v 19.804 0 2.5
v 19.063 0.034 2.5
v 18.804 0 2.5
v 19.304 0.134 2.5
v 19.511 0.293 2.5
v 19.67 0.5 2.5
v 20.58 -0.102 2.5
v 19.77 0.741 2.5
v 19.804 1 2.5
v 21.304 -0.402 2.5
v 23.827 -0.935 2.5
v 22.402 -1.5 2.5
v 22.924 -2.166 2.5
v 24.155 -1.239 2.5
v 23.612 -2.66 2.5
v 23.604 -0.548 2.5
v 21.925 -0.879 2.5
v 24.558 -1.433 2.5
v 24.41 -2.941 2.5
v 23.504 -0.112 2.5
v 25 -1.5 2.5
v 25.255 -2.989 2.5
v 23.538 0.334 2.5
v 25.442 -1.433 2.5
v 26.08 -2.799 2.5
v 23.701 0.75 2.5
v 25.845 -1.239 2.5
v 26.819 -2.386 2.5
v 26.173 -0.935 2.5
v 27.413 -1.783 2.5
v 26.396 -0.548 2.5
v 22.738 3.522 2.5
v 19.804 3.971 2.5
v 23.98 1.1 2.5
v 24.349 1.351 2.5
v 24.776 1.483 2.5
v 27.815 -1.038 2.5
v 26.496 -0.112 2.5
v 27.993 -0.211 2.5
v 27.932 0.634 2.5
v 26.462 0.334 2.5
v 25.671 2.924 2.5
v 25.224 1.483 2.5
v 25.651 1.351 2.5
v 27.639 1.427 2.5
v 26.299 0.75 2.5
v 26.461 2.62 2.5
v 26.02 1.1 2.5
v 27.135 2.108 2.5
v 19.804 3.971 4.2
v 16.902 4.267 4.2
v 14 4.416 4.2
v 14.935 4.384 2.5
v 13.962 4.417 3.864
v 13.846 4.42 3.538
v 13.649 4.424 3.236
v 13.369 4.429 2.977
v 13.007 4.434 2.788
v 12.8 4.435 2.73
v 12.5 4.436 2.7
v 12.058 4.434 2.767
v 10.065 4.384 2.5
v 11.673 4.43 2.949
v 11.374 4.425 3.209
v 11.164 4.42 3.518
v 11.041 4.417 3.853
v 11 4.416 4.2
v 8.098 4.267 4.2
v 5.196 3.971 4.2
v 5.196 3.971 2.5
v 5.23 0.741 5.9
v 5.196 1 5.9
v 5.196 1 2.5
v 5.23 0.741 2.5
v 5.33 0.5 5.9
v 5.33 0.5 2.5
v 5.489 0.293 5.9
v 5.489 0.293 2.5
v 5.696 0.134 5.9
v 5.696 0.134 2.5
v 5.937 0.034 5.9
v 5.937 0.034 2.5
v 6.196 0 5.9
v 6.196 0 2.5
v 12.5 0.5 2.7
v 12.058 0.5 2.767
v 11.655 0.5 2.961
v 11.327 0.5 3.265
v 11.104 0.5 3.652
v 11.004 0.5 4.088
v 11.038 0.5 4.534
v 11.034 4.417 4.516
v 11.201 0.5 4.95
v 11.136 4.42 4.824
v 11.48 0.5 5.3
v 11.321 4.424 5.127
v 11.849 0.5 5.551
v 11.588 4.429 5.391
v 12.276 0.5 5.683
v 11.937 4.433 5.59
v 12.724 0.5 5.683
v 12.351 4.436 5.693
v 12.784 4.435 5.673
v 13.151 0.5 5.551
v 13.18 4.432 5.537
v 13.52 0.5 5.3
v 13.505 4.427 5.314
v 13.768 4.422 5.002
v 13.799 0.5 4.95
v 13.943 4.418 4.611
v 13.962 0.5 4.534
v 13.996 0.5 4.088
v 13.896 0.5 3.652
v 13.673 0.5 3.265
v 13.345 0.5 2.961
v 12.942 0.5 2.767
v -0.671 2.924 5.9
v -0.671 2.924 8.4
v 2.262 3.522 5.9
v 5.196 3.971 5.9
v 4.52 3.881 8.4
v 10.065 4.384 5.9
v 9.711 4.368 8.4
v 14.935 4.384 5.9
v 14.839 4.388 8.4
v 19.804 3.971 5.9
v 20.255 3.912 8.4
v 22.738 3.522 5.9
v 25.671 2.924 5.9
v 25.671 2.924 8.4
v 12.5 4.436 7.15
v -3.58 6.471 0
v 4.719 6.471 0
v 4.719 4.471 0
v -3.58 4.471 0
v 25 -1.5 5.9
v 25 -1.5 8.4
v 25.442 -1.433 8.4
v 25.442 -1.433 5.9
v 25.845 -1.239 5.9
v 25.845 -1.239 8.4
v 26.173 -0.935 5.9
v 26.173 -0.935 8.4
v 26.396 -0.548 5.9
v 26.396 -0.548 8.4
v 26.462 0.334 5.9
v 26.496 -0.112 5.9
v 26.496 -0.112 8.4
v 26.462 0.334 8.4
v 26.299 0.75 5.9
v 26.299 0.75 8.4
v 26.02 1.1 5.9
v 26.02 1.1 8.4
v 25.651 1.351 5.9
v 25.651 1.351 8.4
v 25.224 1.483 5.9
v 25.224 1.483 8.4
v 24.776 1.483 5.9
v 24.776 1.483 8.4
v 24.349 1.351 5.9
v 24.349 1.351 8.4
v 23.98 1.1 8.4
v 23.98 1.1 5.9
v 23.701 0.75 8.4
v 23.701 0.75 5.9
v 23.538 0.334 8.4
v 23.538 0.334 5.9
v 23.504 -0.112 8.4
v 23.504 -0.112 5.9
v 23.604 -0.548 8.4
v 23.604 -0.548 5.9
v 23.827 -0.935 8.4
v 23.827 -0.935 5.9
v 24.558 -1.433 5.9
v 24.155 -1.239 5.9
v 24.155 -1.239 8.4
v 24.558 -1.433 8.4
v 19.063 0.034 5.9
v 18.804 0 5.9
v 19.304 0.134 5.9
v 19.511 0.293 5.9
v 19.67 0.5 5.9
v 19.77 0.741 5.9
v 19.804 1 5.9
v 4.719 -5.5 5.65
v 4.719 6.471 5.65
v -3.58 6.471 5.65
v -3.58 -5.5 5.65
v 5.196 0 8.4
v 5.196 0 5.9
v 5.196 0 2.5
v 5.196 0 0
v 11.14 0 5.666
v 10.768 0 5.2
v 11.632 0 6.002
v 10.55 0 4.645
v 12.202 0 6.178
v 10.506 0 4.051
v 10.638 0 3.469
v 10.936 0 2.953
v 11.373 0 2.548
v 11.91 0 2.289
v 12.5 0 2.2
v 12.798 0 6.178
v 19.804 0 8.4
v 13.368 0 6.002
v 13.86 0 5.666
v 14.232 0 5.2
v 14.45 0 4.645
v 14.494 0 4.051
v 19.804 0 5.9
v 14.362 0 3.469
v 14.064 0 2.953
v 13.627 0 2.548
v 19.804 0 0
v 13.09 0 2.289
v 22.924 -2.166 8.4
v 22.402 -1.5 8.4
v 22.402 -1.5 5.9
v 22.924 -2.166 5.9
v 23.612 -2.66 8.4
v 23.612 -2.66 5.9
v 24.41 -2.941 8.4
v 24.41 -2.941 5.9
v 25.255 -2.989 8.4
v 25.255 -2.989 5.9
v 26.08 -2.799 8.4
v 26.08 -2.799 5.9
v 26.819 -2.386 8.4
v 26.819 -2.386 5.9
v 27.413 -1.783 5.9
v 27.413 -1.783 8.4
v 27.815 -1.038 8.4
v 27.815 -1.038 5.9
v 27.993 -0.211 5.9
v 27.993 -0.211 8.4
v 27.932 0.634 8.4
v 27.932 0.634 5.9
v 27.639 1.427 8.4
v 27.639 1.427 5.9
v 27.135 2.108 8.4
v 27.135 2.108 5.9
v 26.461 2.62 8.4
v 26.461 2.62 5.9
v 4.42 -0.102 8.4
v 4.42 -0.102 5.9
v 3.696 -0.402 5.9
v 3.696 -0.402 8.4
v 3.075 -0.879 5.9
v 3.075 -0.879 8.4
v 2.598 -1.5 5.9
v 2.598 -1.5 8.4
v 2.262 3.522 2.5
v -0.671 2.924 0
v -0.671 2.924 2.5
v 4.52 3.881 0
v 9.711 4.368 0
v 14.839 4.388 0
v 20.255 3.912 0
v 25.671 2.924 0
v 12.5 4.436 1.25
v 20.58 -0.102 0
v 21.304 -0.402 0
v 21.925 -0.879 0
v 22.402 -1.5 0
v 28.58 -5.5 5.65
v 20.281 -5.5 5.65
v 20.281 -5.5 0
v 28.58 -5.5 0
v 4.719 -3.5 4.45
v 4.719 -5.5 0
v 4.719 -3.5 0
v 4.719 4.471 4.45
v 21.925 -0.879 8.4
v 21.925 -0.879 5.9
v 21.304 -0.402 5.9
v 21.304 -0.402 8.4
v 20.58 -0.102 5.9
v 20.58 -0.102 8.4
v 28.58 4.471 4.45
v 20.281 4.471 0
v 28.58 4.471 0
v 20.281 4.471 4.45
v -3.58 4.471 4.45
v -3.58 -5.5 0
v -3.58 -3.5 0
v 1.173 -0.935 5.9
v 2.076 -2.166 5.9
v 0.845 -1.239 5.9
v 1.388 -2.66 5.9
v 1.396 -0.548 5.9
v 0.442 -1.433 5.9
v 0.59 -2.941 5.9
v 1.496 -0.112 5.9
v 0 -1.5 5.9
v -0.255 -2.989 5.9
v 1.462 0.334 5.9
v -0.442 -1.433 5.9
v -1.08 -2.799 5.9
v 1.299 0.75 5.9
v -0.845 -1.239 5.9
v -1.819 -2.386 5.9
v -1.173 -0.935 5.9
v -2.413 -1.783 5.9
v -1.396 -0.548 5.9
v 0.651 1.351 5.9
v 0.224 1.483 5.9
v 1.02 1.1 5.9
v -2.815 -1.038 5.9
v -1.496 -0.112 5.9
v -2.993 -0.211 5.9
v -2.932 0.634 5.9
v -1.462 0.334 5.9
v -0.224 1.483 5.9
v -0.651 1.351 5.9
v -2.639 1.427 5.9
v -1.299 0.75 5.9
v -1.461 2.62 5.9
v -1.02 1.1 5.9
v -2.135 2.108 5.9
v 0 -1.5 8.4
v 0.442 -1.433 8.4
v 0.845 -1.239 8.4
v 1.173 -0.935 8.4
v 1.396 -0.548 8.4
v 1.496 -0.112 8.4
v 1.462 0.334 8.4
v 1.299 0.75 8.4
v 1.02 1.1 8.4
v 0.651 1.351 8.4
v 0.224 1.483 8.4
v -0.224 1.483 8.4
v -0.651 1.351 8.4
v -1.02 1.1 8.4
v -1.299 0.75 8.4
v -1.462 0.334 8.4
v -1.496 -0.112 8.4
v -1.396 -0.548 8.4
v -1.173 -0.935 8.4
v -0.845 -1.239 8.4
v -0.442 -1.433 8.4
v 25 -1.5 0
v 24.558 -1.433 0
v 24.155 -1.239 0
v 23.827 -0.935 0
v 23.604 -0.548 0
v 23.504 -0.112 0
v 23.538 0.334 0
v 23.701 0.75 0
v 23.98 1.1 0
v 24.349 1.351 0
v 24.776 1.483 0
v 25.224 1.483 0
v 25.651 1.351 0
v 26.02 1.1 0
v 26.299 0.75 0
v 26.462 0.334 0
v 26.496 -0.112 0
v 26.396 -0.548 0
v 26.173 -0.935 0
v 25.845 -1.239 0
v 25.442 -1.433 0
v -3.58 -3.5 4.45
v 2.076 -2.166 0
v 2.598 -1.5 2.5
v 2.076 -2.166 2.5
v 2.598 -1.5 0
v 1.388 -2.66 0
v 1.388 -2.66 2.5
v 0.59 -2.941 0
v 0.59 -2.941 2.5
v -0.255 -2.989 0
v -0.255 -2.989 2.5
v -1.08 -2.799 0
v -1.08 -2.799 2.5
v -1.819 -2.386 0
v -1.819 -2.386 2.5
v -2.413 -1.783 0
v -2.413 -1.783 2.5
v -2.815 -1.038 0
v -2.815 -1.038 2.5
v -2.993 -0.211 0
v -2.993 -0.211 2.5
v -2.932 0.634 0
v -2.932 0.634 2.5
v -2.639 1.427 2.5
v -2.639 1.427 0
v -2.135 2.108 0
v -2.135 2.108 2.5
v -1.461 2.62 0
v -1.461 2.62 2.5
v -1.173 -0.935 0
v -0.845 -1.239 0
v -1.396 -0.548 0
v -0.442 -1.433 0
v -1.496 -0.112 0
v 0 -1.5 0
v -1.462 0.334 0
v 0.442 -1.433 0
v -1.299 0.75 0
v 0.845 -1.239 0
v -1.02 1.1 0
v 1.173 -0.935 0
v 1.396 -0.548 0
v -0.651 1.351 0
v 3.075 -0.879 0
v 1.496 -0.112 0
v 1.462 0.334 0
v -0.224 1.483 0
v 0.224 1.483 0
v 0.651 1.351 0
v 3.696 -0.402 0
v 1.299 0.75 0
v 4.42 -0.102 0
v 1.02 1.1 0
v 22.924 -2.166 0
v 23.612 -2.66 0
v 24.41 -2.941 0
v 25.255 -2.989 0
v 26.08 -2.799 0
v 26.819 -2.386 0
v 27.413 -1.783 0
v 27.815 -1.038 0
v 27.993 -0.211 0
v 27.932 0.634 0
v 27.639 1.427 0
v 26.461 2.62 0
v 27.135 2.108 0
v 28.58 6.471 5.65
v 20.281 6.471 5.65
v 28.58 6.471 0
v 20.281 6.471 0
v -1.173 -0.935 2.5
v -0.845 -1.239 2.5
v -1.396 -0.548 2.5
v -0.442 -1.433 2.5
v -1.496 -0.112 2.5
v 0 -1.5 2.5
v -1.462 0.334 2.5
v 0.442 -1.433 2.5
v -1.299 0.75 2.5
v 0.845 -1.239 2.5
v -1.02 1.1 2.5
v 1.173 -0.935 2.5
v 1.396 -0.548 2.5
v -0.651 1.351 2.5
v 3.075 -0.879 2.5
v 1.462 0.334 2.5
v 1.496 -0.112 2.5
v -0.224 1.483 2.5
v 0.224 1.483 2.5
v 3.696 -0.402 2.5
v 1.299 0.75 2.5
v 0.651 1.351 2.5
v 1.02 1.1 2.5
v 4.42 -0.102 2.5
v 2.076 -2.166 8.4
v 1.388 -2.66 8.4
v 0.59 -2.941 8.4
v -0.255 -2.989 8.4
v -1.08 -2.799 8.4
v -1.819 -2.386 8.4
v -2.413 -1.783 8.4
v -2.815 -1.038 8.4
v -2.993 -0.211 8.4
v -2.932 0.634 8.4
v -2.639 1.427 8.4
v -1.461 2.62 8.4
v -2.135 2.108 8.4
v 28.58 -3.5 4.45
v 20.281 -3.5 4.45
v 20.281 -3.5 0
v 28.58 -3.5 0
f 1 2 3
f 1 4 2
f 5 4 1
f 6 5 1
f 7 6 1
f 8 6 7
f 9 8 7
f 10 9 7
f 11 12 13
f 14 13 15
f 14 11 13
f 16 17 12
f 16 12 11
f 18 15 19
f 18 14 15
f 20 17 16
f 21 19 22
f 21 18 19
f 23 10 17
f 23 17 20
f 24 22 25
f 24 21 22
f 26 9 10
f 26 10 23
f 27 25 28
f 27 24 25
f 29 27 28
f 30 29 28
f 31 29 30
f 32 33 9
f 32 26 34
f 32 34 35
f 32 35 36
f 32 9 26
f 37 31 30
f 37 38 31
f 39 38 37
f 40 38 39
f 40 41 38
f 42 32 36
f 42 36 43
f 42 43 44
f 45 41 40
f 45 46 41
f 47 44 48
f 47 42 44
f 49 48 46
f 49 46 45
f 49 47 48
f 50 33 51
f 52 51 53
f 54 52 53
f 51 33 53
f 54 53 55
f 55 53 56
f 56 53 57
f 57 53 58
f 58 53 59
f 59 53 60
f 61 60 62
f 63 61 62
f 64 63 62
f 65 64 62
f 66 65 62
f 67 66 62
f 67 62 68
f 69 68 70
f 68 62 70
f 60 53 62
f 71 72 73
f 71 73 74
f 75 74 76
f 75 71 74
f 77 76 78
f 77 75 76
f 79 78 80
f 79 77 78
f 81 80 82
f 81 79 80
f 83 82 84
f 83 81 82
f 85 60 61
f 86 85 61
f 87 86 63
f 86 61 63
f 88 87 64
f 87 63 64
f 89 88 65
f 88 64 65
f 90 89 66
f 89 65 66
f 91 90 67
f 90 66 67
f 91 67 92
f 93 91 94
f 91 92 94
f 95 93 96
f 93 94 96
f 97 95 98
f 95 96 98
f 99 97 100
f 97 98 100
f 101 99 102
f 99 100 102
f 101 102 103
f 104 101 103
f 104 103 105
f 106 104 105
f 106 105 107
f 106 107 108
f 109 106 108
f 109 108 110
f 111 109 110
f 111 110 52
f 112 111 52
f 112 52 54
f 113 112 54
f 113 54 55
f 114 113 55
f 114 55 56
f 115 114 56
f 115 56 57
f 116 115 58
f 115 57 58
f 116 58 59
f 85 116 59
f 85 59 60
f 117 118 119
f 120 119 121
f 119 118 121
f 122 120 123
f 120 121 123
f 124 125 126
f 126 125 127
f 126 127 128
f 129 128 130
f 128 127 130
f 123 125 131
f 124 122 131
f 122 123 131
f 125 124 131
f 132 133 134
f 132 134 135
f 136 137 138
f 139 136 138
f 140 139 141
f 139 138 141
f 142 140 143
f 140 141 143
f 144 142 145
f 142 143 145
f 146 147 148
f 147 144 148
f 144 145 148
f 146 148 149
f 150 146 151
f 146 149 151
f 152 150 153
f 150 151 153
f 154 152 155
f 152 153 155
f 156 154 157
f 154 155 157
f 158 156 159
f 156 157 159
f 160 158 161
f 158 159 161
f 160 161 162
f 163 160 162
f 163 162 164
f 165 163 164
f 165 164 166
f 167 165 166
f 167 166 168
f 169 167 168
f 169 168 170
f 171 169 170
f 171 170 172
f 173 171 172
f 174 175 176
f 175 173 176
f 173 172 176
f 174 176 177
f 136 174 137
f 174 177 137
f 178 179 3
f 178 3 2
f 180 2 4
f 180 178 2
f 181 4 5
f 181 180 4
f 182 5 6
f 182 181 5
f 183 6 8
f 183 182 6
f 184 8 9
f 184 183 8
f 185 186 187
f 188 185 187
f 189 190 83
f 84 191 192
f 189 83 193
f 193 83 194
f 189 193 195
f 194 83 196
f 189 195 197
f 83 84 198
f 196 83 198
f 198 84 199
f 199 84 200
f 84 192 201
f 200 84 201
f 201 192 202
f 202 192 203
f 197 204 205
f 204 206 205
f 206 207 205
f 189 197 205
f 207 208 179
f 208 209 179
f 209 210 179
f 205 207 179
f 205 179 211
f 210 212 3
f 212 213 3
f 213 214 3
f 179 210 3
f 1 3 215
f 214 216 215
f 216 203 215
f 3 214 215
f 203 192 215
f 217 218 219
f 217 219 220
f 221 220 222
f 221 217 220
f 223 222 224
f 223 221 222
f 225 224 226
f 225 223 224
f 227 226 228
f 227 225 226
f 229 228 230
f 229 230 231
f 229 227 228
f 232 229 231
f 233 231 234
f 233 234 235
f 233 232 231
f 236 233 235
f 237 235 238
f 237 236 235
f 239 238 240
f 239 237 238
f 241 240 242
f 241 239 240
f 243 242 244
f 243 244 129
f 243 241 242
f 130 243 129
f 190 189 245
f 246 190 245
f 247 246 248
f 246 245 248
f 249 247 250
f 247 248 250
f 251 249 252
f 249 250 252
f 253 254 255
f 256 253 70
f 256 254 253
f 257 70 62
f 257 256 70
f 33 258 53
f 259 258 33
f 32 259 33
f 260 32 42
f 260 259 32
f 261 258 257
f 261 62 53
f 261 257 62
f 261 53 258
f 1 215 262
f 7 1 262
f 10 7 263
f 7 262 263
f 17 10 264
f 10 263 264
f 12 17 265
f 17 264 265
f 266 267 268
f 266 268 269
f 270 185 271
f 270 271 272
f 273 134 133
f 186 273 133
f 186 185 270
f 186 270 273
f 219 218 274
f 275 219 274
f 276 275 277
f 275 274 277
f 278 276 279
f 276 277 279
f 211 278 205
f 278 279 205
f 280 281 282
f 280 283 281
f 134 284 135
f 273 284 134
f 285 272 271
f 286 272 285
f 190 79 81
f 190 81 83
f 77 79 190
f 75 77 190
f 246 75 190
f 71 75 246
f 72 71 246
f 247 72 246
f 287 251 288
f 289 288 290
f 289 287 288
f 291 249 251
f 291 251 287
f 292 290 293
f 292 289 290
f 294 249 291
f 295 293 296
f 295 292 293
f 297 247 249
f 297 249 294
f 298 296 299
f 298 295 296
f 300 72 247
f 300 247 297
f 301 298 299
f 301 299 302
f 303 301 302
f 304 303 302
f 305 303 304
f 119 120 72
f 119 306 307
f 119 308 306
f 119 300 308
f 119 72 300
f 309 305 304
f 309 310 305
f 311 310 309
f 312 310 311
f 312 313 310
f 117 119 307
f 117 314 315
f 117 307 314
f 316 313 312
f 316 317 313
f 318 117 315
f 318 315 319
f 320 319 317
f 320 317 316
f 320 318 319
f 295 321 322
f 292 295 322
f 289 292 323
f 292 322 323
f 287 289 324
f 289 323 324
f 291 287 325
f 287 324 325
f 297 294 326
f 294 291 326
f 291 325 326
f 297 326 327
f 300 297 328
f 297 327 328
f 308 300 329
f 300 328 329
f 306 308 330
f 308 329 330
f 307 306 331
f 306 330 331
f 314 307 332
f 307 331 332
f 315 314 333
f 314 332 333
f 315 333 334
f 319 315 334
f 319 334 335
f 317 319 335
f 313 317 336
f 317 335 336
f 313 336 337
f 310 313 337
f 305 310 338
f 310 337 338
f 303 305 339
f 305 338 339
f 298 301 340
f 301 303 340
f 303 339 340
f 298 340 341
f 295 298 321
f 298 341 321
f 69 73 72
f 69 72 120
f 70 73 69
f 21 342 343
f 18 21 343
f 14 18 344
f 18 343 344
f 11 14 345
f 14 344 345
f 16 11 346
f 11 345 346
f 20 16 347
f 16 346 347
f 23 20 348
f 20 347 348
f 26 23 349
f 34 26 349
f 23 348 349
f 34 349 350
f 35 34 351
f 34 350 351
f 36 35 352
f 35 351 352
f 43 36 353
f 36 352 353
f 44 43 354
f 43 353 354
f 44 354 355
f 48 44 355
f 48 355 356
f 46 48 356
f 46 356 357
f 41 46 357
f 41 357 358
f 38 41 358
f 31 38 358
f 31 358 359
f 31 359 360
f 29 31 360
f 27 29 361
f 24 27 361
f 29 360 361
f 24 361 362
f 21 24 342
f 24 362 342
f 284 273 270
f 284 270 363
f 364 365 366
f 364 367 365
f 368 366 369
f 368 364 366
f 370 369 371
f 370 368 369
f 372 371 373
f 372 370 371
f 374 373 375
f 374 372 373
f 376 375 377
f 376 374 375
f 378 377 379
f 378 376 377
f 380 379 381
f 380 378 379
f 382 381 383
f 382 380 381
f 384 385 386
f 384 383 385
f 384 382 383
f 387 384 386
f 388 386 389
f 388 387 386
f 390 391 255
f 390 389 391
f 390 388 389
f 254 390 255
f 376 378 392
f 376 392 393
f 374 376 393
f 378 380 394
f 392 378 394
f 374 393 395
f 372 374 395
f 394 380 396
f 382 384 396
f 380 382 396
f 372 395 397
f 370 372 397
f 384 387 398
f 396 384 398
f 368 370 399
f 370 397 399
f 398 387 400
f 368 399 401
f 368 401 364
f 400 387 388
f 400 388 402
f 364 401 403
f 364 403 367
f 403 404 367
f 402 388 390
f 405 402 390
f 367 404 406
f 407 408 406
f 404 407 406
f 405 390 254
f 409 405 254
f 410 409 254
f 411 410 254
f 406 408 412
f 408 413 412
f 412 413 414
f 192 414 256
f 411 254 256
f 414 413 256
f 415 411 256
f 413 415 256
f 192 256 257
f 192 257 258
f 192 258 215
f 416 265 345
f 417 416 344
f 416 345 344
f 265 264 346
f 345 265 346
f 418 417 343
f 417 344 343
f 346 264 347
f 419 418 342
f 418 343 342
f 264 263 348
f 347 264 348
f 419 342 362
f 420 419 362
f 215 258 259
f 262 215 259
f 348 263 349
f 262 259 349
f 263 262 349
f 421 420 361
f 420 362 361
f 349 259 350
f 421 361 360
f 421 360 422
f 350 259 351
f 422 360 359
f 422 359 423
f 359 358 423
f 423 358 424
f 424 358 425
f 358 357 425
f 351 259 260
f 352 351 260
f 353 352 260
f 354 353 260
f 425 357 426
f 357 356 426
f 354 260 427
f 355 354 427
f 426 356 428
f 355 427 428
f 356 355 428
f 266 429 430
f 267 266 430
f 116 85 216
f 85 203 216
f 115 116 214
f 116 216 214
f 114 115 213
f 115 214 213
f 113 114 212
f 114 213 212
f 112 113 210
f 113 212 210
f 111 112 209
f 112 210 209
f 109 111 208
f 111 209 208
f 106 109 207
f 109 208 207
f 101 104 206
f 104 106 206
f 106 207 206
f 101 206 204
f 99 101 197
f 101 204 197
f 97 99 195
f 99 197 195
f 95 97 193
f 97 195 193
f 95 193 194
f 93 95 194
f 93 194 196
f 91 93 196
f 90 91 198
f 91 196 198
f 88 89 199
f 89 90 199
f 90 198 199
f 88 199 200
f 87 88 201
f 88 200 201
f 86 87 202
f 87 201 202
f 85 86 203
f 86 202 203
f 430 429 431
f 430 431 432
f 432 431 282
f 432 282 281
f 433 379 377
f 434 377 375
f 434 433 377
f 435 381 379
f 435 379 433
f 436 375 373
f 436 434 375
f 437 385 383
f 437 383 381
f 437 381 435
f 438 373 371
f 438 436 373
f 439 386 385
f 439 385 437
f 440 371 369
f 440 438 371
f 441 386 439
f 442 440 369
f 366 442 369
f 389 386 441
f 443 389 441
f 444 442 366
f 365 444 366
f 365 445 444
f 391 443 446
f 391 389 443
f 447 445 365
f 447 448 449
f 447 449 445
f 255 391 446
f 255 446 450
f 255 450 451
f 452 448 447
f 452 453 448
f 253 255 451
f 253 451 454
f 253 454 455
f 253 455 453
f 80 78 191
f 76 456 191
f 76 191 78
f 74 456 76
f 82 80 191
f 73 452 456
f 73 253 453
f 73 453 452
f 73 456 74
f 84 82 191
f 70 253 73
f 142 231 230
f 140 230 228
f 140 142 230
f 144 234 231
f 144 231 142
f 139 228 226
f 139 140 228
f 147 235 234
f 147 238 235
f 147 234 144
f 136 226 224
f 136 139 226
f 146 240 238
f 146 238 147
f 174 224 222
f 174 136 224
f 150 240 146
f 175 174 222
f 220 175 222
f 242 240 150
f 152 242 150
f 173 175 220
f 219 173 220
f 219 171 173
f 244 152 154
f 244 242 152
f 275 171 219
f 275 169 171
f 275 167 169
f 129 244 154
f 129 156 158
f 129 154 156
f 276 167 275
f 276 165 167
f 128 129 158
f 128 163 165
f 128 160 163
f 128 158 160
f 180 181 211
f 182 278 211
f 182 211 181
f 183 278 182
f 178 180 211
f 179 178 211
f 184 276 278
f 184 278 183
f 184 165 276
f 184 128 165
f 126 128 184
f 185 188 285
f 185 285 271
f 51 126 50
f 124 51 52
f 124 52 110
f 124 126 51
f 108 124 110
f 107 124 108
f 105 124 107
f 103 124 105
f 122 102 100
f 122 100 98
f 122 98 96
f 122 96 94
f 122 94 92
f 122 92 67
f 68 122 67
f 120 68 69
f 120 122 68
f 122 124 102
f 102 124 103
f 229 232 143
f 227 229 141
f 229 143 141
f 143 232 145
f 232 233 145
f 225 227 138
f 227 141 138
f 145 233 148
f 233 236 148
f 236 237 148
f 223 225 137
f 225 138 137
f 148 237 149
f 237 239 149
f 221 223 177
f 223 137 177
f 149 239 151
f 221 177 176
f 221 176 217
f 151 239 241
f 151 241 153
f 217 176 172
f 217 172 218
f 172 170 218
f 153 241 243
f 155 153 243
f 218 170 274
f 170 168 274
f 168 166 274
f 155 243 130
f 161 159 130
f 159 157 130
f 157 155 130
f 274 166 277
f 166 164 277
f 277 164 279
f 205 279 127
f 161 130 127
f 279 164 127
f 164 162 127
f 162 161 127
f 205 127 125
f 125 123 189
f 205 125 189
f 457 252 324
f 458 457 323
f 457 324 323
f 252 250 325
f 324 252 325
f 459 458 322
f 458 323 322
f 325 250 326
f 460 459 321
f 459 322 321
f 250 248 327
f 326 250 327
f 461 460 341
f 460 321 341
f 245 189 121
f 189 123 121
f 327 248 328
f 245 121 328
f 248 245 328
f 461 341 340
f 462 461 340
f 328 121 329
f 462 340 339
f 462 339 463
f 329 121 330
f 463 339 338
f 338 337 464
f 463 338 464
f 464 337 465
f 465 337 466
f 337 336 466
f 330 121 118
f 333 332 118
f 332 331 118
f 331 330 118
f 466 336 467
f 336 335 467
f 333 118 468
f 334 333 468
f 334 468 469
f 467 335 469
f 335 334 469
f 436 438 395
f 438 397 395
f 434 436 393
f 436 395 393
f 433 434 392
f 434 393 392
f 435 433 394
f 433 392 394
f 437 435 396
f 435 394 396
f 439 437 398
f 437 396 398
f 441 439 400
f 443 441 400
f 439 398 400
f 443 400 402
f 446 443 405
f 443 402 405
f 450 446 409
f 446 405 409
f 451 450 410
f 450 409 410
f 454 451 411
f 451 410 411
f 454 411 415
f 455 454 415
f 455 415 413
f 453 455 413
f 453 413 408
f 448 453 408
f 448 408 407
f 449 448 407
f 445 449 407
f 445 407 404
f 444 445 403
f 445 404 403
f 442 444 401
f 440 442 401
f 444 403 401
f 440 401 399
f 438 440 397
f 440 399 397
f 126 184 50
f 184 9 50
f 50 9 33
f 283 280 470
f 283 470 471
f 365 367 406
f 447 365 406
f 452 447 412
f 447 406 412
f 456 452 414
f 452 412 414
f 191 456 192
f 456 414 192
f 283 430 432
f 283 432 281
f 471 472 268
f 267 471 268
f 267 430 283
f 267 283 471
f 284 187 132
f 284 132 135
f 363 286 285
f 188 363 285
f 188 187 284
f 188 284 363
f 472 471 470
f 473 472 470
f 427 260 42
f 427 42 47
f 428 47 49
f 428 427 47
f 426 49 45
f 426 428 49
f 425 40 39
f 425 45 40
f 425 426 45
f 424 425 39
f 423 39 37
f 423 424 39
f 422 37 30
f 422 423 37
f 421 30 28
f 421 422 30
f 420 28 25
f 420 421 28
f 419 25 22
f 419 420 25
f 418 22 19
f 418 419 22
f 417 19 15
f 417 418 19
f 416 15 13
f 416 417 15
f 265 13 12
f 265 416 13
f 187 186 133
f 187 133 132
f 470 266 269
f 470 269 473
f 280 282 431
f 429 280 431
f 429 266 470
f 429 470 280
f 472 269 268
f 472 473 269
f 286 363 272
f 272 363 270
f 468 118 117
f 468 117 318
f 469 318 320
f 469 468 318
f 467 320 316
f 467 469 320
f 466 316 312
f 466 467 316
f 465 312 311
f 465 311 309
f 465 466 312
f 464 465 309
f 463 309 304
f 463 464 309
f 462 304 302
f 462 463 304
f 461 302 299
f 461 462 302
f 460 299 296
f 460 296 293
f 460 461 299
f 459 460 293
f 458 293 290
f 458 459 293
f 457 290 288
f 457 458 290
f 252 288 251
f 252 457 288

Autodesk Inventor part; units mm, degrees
ref_plane "YZ Plane" through (0, 0, 0) normal (1, 0, 0) x (0, 1, 0)
ref_plane "XZ Plane" through (0, 0, 0) normal (0, 1, 0) x (-1, 0, 0)
ref_plane "XY Plane" through (0, 0, 0) normal (0, 0, 1) x (1, 0, 0)
sketch "Skizze1" plane through (0, 0, 0) normal (0, 0, 1) x (1, 0, 0)
  line L0 (0, 0) -> (25, 0) construction
  arc A0 (0, 3) -> (2.5981, -1.5) centre (0, 0) ccw
  arc A1 (22.4019, -1.5) -> (25, 3) centre (25, 0) ccw
  arc A2 (22.4019, -1.5) -> (19.8038, 0) centre (19.8038, -3) ccw
  arc A3 (5.1962, 0) -> (2.5981, -1.5) centre (5.1962, -3) ccw
  line L1 (0, 3) -> (25, 3)
  line L2 (5.1962, 0) -> (19.8038, 0)
  line L3 (12.5, 0) -> (12.5, 11.1623) construction
  line L4 (-0.6713, 2.9239) -> (12.5, 5.9481) construction
  line L5 (12.5, 5.9481) -> (25.6713, 2.9239) construction
  spline S0 degree 2 poles (-0.6713, 2.9239) (12.5, 5.9481) (25.6713, 2.9239) knots 1 1 1 2 2 2
  dimension "d0" = 25
  dimension "d1" = 3
  dimension "d2" = 3
ref_plane "Arbeitsebene1" through (0, 3, 0) normal (0, 0, -1) x (1, 0, 0)
extrude "Extrusion1" add sketch "Skizze1" along normal blind 2.5
sketch "Skizze2" plane through (0, 0, 2.5) normal (0, 0, 1) x (1, 0, 0)
  arc A0 (-0.6713, 2.9239) -> (2.5981, -1.5) centre (0, 0) ccw projected
  arc A1 (22.4019, -1.5) -> (25.6713, 2.9239) centre (25, 0) ccw projected
  point P0 (0, 3)
  point P1 (25, 3)
hole "Bohrung1" at (0, 0, 2.5) at (25, 0, 2.5) direction (0, 0, -1) diameter 3 end through all
sketch "Skizze4" plane through (0, 0, 2.5) normal (0, 0, 1) x (1, 0, 0)
  line L0 (5.1962, 0) -> (19.8038, 0)
  line L1 (5.1962, 0) -> (5.1962, 3.9711)
  line L2 (19.8038, 0) -> (19.8038, 3.9711)
  line L3 (5.1962, 0) -> (19.8038, 0) projected
  spline S0 degree 2 poles (25.6713, 2.9239) (12.5, 5.9481) (-0.6713, 2.9239) knots 0 0 0 1 1 1 projected
extrude "Extrusion2" add sketch "Skizze4" along normal blind 1.7
mirror "Spiegeln1" about plane through (12.5, 1.8725, 4.2) normal (0, 0, 1)
fillet "Rundung1" radius 1 2 edges at (5.1962, 0, 4.2) (19.8038, 0, 4.2)
ref_plane "Arbeitsebene2" through (19.8038, 0, 5.65) normal (0, 0, -1) x (-1, 0, 0)
sketch "Skizze5" plane through (19.8038, 0, 5.65) normal (0, 0, -1) x (-1, 0, 0)
  arc A0 (-5.8675, 2.9239) -> (-2.5981, -1.5) centre (-5.1962, 0) ccw construction
  arc A1 (0, 0) -> (-2.5981, -1.5) centre (0, -3) ccw construction
  line L0 (0, 0) -> (1, 0) construction
  arc A2 (0, 1) -> (1, 0) centre (1, 1) ccw construction
  line L1 (0, 3.9711) -> (0, 1) construction
  circle A3 centre (-5.1962, 0) radius 1.5 construction
  line L2 (-8.7757, 6.4711) -> (-0.4769, 6.4711)
  line L3 (-0.4769, 6.4711) -> (-0.4769, -5.5)
  line L4 (-0.4769, -5.5) -> (-8.7757, -5.5)
  line L5 (-8.7757, -5.5) -> (-8.7757, 6.4711)
  line L6 (14.6077, 1) -> (14.6077, 3.9711) projected
  arc A4 (13.6077, 0) -> (14.6077, 1) centre (13.6077, 1) ccw projected
  line L7 (13.6077, 0) -> (14.6077, 0) projected
  arc A5 (17.2058, -1.5) -> (14.6077, 0) centre (14.6077, -3) ccw projected
  arc A6 (17.2058, -1.5) -> (20.4752, 2.9239) centre (19.8038, 0) ccw projected
  dimension "d17" = 2.5
  dimension "d36" = 2.5
extrude "Extrusion3" add sketch "Skizze5" along normal blind 1.2 separate body
sketch "Skizze6" plane through (19.8038, 0, 4.45) normal (0, 0, -1) x (-1, 0, 0)
  line L0 (-8.7757, -5.5) -> (-0.4769, -5.5) projected
  line L1 (-0.4769, -5.5) -> (-0.4769, 6.4711) projected
  line L2 (-8.7757, 6.4711) -> (-0.4769, 6.4711)
  line L3 (-0.4769, 6.4711) -> (-0.4769, 4.4711)
  line L4 (-0.4769, 4.4711) -> (-8.7757, 4.4711)
  line L5 (-8.7757, 4.4711) -> (-8.7757, 6.4711)
  line L6 (-8.7757, -5.5) -> (-0.4769, -5.5)
  line L7 (-0.4769, -5.5) -> (-0.4769, -3.5)
  line L8 (-0.4769, -3.5) -> (-8.7757, -3.5)
  line L9 (-8.7757, -3.5) -> (-8.7757, -5.5)
  point P0 (19.8038, 0)
  dimension "d20" = 2
  dimension "d21" = 2
extrude "Extrusion4" add sketch "Skizze6" along normal up to surface (4.45 mm away)
ref_plane "Arbeitsebene3" through (12.5, 0, 8.4) normal (1, 0, 0) x (0, 1, 0)
mirror "Spiegeln2" about plane through (12.5, 0, 8.4) normal (1, 0, 0) of "Extrusion3", "Extrusion4"
sketch "Skizze7" plane through (5.1962, 0, 0) normal (0, -1, 0) x (1, 0, 0)
  line L0 (1, 2.5) -> (1, 5.9) projected
  line L1 (13.6077, 5.9) -> (13.6077, 2.5) projected
  line L2 (1, 4.2) -> (13.6077, 4.2) construction
  point P0 (-5.1962, 0)
  point P1 (7.3038, 4.2)
hole "Bohrung2" at (12.5, 0, 4.2) direction (0, 1, 0) diameter 3 end through all countersink diameter 4 countersink angle 90
equation "\"d0\" = Hebel_B"
equation "\"d1\" = FingerWall"
equation "\"d36\" = d17"
equation "\"d21\" = d20"
equation "\"FingerLaenge_B\" = 25"
equation "\"Hebel_B\" = 25"
equation "\"Finger_width\" = 22"
equation "\"Hebel_basis_2\" = 15"
equation "\"Finger_diameter\" = 8"
equation "\"FingerWall\" = 3"
equation "\"Join_width\" = 3"
equation "\"bearingHole\" = 3"
equation "\"bearingWall\" = 4"
equation "\"support_D\" = 0.25"
equation "\"d37\" = support_D"
properties part number "Hebel_B dual"
